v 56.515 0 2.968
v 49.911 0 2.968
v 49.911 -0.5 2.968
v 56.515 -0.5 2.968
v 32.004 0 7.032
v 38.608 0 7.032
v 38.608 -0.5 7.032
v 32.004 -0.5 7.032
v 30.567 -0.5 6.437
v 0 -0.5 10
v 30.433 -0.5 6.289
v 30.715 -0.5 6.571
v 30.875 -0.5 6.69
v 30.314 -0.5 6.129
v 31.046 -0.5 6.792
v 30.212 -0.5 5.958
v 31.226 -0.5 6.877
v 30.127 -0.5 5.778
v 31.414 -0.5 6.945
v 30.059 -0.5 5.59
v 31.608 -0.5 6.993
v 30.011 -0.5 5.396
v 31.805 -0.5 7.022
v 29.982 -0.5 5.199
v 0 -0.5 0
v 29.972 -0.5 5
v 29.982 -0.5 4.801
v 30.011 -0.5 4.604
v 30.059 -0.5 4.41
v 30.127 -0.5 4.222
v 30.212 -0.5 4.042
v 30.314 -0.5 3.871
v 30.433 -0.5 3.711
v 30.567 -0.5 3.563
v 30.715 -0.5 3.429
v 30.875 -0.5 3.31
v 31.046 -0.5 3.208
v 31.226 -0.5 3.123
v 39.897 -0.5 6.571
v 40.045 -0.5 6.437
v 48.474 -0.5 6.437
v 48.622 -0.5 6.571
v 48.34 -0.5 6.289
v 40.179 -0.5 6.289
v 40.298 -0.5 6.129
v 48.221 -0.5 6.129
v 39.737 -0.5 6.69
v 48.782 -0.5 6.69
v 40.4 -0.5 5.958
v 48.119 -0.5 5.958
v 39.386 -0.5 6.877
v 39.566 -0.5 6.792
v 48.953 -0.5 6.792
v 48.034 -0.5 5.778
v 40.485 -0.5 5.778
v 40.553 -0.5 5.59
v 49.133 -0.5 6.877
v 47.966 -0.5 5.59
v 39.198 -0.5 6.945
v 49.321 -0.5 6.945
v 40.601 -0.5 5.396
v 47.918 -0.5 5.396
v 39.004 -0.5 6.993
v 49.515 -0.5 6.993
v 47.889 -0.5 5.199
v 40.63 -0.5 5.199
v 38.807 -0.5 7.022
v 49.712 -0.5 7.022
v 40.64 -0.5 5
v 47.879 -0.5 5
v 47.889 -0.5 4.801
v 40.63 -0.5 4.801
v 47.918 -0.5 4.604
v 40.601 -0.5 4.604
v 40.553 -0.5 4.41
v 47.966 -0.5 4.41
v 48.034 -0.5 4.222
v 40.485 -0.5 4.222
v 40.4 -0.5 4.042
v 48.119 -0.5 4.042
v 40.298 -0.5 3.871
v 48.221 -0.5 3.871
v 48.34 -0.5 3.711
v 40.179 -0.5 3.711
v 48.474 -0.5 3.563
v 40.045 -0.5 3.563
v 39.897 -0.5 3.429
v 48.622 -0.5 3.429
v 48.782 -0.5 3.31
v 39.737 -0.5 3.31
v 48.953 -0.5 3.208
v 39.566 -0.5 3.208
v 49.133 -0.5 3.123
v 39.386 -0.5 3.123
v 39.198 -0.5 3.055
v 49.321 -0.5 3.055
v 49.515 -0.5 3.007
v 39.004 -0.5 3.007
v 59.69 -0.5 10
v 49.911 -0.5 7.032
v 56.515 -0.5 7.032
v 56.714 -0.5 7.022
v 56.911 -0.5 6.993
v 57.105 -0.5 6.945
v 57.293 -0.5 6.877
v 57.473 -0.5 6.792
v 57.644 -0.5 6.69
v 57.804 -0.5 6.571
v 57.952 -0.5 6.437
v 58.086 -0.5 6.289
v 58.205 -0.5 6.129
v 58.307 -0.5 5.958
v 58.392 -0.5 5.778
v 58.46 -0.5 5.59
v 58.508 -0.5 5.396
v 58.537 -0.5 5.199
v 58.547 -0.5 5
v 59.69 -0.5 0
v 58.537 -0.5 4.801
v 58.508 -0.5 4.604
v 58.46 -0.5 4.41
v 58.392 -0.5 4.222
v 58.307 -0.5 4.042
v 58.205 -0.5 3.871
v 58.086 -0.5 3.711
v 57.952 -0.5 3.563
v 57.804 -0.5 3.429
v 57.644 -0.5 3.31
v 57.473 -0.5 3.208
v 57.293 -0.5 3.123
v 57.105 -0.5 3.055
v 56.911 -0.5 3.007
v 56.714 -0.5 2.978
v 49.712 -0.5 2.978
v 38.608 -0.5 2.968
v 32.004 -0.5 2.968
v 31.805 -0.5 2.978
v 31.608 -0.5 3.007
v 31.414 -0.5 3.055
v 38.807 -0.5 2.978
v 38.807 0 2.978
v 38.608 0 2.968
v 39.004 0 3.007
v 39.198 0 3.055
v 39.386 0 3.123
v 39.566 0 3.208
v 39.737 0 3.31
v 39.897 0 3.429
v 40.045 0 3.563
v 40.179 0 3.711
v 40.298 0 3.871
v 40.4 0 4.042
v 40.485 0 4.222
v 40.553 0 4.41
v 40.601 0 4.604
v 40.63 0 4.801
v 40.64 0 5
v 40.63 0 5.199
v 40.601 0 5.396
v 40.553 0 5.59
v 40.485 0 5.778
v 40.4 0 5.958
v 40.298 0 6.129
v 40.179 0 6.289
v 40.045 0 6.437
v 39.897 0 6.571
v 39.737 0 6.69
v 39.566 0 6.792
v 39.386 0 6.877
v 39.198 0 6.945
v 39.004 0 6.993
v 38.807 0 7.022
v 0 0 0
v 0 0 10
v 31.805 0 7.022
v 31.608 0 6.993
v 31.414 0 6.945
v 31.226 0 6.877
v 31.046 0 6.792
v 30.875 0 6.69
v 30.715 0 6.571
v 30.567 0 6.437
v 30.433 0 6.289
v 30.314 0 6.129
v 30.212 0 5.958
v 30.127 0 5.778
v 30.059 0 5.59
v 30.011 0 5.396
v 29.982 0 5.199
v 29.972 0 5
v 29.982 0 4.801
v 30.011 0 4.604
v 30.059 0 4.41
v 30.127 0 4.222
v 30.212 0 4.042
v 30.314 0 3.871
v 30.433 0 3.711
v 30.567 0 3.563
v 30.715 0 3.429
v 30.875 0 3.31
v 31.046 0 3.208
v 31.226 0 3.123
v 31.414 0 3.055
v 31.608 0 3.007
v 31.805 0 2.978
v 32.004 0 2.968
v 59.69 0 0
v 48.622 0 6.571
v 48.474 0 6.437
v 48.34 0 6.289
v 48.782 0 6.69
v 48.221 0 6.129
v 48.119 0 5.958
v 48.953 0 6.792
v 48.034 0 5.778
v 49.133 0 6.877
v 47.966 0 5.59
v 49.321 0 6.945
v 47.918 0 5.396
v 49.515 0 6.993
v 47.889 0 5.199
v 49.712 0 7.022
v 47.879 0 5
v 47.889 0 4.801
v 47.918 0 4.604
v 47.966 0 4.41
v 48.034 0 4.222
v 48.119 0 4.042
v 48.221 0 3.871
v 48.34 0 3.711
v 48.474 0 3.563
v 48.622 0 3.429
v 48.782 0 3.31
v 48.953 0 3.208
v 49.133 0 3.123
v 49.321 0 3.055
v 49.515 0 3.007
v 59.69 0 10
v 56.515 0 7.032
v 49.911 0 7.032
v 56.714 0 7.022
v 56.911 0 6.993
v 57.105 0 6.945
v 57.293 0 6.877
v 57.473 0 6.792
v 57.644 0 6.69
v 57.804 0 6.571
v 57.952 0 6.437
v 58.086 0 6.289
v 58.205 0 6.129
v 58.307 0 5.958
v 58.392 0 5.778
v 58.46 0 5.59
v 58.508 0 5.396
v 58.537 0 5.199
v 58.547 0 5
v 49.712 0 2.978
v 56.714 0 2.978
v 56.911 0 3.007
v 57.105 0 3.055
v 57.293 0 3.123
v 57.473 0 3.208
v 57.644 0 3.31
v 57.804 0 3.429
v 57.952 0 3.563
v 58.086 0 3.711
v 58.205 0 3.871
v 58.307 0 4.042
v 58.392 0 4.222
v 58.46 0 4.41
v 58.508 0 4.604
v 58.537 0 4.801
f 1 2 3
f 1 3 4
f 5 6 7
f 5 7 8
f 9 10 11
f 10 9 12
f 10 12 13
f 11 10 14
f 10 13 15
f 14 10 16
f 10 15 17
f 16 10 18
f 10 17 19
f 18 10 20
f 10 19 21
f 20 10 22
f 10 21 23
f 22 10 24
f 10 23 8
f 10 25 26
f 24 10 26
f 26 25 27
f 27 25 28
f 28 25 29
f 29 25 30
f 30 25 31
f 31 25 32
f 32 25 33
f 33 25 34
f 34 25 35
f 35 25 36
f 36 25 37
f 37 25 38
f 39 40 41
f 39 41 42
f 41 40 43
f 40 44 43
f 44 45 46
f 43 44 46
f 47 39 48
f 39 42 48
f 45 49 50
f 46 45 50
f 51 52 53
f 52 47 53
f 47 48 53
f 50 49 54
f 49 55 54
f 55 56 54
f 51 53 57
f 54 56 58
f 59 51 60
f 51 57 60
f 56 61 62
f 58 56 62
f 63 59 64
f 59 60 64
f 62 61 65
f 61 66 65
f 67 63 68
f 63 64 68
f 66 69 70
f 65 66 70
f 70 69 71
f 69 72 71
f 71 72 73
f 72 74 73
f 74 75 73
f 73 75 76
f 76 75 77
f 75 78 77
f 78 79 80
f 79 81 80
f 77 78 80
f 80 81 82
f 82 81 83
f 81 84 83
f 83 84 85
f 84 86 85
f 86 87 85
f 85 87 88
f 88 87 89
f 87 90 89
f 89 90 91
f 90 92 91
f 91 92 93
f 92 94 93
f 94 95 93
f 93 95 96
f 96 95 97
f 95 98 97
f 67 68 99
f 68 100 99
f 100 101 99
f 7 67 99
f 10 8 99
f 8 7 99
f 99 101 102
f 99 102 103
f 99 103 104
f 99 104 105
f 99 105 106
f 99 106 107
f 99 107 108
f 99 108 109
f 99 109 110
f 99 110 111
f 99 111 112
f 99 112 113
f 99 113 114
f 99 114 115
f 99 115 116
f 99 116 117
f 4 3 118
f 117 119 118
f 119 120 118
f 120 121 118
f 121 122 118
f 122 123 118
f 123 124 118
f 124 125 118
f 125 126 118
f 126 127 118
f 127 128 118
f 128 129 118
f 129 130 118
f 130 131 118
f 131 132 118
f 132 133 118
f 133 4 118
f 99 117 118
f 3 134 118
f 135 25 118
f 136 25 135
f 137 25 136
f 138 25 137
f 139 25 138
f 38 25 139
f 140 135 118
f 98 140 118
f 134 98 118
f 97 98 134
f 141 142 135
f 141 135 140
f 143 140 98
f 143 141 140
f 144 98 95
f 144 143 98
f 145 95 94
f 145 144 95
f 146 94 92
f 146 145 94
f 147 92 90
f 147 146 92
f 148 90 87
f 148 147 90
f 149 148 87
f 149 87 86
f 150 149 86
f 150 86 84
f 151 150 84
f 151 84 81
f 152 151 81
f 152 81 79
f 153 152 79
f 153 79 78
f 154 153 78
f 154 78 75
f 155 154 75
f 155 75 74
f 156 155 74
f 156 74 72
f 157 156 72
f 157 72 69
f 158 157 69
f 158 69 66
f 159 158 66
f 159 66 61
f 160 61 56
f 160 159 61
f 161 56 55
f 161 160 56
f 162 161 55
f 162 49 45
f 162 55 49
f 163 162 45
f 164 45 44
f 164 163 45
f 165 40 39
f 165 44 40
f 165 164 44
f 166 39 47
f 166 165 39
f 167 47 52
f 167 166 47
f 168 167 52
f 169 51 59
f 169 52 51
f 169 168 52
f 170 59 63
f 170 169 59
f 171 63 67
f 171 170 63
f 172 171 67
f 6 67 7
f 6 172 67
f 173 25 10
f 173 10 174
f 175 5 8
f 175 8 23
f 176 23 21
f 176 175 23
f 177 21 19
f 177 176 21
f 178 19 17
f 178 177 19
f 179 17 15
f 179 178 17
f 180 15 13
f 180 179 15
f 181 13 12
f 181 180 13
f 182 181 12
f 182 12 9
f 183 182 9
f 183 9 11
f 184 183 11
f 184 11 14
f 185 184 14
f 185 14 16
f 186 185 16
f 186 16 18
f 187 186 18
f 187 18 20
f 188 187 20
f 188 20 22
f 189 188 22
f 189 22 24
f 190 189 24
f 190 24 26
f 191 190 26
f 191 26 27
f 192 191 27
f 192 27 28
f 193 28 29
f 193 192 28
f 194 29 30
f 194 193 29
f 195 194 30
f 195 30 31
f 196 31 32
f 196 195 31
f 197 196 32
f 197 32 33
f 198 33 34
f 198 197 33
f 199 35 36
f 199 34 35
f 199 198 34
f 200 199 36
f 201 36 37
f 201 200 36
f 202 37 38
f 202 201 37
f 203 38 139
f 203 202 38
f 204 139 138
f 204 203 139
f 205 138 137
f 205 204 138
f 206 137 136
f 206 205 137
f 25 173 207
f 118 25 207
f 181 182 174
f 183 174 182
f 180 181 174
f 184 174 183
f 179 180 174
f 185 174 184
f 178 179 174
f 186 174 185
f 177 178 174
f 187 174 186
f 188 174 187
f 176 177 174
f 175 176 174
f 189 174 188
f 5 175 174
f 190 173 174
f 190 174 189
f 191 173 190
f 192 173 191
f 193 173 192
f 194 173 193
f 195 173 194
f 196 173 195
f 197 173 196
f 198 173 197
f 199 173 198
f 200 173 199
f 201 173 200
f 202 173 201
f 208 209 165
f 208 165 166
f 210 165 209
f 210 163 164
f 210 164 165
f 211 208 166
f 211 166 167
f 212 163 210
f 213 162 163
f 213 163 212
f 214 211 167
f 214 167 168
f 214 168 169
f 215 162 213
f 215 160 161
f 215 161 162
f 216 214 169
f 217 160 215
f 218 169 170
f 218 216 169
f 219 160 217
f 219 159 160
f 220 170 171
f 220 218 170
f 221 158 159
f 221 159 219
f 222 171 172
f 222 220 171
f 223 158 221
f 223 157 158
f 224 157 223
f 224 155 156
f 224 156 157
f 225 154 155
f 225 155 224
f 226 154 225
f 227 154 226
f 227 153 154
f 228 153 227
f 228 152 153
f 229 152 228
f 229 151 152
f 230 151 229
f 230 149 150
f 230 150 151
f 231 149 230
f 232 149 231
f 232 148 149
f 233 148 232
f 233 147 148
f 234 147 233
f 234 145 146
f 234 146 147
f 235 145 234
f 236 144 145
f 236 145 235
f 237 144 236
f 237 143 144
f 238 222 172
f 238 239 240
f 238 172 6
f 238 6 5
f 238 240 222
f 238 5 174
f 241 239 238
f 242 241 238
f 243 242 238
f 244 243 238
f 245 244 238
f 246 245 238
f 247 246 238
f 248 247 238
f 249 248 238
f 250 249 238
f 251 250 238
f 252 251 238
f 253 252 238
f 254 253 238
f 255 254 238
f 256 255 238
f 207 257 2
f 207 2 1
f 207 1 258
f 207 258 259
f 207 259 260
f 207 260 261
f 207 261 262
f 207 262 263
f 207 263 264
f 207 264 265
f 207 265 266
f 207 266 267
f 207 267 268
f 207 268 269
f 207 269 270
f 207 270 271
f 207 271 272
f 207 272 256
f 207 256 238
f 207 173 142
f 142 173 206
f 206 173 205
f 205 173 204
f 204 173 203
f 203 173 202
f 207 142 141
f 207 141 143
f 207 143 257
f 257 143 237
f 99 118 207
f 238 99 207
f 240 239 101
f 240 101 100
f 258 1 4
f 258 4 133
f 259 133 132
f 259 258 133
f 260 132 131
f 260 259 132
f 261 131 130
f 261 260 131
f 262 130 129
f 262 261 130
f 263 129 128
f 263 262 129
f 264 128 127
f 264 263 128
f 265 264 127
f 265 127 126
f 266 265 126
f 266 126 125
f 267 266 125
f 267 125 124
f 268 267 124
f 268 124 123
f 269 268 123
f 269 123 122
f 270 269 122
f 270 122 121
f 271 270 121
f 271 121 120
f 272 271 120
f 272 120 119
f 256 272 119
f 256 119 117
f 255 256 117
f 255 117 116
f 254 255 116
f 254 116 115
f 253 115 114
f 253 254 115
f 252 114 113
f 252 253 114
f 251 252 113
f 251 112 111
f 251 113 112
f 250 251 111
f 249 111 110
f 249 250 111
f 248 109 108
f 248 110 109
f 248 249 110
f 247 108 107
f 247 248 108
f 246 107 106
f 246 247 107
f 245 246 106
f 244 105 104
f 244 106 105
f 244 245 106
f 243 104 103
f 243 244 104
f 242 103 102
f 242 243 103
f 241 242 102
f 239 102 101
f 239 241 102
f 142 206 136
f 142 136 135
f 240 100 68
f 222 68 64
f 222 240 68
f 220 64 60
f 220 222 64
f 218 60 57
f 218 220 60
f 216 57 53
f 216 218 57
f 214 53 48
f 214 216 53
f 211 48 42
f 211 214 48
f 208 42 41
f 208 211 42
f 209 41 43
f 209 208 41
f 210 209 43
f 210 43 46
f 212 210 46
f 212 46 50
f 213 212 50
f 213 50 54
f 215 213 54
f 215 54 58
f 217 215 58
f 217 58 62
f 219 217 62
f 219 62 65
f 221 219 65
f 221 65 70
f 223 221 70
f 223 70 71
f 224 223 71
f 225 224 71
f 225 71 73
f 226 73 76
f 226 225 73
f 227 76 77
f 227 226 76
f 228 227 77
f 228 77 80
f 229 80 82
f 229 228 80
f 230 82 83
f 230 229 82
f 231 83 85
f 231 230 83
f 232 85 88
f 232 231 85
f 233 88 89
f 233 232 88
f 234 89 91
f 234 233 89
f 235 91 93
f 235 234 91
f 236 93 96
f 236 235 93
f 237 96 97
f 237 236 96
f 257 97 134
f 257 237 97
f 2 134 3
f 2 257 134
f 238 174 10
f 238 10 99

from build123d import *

# Parameters (mm, degrees)
SKETCH1_W           = 59.69
SKETCH1_H           = 0.5
EXTRUDE_THIN1_DEPTH = 10
SKETCH3_OUTSIDE_W   = 73.794
SKETCH3_OUTSIDE_H   = 24.104
SKETCH3_OUTSIDE_W_2 = 59.69
SKETCH3_OUTSIDE_H_2 = 10
CUT_EXTRUDE5_DEPTH  = 2.54


with BuildPart() as part:
    # Sketch1 → Extrude-Thin1 (new body)
    with BuildSketch(Plane.XY):
        with Locations((29.845, -0.25)):
            Rectangle(SKETCH1_W, SKETCH1_H)
    extrude(amount=EXTRUDE_THIN1_DEPTH)

    # Sketch3 outside → Cut-Extrude5 (cut)
    # profile 1 of 3: a face of its own
    with BuildSketch(Plane(origin=(0, 0, 0), x_dir=(1, 0, 0), z_dir=(0, 1, 0))):
        with Locations((29.845, -5)):
            Rectangle(SKETCH3_OUTSIDE_W, SKETCH3_OUTSIDE_H)
        with Locations((29.845, -5)):
            Rectangle(SKETCH3_OUTSIDE_W_2, SKETCH3_OUTSIDE_H_2, mode=Mode.SUBTRACT)
    # profile 2 of 3: a face of its own
    with BuildSketch(Plane(origin=(0, 0, 0), x_dir=(1, 0, 0), z_dir=(0, 1, 0))):
        with BuildLine():
            Line((32.004, -2.968), (38.608, -2.968))
            ThreePointArc((38.608, -2.968), (40.64, -5), (38.608, -7.032))
            Line((38.608, -7.032), (32.004, -7.032))
            ThreePointArc((32.004, -7.032), (29.972, -5), (32.004, -2.968))
        make_face()
    # profile 3 of 3: a face of its own
    with BuildSketch(Plane(origin=(0, 0, 0), x_dir=(1, 0, 0), z_dir=(0, 1, 0))):
        with BuildLine():
            Line((49.911, -2.968), (56.515, -2.968))
            ThreePointArc((56.515, -2.968), (58.547, -5), (56.515, -7.032))
            Line((56.515, -7.032), (49.911, -7.032))
            ThreePointArc((49.911, -7.032), (47.879, -5), (49.911, -2.968))
        make_face()
    extrude(amount=-CUT_EXTRUDE5_DEPTH, mode=Mode.SUBTRACT)


solid = part.part
